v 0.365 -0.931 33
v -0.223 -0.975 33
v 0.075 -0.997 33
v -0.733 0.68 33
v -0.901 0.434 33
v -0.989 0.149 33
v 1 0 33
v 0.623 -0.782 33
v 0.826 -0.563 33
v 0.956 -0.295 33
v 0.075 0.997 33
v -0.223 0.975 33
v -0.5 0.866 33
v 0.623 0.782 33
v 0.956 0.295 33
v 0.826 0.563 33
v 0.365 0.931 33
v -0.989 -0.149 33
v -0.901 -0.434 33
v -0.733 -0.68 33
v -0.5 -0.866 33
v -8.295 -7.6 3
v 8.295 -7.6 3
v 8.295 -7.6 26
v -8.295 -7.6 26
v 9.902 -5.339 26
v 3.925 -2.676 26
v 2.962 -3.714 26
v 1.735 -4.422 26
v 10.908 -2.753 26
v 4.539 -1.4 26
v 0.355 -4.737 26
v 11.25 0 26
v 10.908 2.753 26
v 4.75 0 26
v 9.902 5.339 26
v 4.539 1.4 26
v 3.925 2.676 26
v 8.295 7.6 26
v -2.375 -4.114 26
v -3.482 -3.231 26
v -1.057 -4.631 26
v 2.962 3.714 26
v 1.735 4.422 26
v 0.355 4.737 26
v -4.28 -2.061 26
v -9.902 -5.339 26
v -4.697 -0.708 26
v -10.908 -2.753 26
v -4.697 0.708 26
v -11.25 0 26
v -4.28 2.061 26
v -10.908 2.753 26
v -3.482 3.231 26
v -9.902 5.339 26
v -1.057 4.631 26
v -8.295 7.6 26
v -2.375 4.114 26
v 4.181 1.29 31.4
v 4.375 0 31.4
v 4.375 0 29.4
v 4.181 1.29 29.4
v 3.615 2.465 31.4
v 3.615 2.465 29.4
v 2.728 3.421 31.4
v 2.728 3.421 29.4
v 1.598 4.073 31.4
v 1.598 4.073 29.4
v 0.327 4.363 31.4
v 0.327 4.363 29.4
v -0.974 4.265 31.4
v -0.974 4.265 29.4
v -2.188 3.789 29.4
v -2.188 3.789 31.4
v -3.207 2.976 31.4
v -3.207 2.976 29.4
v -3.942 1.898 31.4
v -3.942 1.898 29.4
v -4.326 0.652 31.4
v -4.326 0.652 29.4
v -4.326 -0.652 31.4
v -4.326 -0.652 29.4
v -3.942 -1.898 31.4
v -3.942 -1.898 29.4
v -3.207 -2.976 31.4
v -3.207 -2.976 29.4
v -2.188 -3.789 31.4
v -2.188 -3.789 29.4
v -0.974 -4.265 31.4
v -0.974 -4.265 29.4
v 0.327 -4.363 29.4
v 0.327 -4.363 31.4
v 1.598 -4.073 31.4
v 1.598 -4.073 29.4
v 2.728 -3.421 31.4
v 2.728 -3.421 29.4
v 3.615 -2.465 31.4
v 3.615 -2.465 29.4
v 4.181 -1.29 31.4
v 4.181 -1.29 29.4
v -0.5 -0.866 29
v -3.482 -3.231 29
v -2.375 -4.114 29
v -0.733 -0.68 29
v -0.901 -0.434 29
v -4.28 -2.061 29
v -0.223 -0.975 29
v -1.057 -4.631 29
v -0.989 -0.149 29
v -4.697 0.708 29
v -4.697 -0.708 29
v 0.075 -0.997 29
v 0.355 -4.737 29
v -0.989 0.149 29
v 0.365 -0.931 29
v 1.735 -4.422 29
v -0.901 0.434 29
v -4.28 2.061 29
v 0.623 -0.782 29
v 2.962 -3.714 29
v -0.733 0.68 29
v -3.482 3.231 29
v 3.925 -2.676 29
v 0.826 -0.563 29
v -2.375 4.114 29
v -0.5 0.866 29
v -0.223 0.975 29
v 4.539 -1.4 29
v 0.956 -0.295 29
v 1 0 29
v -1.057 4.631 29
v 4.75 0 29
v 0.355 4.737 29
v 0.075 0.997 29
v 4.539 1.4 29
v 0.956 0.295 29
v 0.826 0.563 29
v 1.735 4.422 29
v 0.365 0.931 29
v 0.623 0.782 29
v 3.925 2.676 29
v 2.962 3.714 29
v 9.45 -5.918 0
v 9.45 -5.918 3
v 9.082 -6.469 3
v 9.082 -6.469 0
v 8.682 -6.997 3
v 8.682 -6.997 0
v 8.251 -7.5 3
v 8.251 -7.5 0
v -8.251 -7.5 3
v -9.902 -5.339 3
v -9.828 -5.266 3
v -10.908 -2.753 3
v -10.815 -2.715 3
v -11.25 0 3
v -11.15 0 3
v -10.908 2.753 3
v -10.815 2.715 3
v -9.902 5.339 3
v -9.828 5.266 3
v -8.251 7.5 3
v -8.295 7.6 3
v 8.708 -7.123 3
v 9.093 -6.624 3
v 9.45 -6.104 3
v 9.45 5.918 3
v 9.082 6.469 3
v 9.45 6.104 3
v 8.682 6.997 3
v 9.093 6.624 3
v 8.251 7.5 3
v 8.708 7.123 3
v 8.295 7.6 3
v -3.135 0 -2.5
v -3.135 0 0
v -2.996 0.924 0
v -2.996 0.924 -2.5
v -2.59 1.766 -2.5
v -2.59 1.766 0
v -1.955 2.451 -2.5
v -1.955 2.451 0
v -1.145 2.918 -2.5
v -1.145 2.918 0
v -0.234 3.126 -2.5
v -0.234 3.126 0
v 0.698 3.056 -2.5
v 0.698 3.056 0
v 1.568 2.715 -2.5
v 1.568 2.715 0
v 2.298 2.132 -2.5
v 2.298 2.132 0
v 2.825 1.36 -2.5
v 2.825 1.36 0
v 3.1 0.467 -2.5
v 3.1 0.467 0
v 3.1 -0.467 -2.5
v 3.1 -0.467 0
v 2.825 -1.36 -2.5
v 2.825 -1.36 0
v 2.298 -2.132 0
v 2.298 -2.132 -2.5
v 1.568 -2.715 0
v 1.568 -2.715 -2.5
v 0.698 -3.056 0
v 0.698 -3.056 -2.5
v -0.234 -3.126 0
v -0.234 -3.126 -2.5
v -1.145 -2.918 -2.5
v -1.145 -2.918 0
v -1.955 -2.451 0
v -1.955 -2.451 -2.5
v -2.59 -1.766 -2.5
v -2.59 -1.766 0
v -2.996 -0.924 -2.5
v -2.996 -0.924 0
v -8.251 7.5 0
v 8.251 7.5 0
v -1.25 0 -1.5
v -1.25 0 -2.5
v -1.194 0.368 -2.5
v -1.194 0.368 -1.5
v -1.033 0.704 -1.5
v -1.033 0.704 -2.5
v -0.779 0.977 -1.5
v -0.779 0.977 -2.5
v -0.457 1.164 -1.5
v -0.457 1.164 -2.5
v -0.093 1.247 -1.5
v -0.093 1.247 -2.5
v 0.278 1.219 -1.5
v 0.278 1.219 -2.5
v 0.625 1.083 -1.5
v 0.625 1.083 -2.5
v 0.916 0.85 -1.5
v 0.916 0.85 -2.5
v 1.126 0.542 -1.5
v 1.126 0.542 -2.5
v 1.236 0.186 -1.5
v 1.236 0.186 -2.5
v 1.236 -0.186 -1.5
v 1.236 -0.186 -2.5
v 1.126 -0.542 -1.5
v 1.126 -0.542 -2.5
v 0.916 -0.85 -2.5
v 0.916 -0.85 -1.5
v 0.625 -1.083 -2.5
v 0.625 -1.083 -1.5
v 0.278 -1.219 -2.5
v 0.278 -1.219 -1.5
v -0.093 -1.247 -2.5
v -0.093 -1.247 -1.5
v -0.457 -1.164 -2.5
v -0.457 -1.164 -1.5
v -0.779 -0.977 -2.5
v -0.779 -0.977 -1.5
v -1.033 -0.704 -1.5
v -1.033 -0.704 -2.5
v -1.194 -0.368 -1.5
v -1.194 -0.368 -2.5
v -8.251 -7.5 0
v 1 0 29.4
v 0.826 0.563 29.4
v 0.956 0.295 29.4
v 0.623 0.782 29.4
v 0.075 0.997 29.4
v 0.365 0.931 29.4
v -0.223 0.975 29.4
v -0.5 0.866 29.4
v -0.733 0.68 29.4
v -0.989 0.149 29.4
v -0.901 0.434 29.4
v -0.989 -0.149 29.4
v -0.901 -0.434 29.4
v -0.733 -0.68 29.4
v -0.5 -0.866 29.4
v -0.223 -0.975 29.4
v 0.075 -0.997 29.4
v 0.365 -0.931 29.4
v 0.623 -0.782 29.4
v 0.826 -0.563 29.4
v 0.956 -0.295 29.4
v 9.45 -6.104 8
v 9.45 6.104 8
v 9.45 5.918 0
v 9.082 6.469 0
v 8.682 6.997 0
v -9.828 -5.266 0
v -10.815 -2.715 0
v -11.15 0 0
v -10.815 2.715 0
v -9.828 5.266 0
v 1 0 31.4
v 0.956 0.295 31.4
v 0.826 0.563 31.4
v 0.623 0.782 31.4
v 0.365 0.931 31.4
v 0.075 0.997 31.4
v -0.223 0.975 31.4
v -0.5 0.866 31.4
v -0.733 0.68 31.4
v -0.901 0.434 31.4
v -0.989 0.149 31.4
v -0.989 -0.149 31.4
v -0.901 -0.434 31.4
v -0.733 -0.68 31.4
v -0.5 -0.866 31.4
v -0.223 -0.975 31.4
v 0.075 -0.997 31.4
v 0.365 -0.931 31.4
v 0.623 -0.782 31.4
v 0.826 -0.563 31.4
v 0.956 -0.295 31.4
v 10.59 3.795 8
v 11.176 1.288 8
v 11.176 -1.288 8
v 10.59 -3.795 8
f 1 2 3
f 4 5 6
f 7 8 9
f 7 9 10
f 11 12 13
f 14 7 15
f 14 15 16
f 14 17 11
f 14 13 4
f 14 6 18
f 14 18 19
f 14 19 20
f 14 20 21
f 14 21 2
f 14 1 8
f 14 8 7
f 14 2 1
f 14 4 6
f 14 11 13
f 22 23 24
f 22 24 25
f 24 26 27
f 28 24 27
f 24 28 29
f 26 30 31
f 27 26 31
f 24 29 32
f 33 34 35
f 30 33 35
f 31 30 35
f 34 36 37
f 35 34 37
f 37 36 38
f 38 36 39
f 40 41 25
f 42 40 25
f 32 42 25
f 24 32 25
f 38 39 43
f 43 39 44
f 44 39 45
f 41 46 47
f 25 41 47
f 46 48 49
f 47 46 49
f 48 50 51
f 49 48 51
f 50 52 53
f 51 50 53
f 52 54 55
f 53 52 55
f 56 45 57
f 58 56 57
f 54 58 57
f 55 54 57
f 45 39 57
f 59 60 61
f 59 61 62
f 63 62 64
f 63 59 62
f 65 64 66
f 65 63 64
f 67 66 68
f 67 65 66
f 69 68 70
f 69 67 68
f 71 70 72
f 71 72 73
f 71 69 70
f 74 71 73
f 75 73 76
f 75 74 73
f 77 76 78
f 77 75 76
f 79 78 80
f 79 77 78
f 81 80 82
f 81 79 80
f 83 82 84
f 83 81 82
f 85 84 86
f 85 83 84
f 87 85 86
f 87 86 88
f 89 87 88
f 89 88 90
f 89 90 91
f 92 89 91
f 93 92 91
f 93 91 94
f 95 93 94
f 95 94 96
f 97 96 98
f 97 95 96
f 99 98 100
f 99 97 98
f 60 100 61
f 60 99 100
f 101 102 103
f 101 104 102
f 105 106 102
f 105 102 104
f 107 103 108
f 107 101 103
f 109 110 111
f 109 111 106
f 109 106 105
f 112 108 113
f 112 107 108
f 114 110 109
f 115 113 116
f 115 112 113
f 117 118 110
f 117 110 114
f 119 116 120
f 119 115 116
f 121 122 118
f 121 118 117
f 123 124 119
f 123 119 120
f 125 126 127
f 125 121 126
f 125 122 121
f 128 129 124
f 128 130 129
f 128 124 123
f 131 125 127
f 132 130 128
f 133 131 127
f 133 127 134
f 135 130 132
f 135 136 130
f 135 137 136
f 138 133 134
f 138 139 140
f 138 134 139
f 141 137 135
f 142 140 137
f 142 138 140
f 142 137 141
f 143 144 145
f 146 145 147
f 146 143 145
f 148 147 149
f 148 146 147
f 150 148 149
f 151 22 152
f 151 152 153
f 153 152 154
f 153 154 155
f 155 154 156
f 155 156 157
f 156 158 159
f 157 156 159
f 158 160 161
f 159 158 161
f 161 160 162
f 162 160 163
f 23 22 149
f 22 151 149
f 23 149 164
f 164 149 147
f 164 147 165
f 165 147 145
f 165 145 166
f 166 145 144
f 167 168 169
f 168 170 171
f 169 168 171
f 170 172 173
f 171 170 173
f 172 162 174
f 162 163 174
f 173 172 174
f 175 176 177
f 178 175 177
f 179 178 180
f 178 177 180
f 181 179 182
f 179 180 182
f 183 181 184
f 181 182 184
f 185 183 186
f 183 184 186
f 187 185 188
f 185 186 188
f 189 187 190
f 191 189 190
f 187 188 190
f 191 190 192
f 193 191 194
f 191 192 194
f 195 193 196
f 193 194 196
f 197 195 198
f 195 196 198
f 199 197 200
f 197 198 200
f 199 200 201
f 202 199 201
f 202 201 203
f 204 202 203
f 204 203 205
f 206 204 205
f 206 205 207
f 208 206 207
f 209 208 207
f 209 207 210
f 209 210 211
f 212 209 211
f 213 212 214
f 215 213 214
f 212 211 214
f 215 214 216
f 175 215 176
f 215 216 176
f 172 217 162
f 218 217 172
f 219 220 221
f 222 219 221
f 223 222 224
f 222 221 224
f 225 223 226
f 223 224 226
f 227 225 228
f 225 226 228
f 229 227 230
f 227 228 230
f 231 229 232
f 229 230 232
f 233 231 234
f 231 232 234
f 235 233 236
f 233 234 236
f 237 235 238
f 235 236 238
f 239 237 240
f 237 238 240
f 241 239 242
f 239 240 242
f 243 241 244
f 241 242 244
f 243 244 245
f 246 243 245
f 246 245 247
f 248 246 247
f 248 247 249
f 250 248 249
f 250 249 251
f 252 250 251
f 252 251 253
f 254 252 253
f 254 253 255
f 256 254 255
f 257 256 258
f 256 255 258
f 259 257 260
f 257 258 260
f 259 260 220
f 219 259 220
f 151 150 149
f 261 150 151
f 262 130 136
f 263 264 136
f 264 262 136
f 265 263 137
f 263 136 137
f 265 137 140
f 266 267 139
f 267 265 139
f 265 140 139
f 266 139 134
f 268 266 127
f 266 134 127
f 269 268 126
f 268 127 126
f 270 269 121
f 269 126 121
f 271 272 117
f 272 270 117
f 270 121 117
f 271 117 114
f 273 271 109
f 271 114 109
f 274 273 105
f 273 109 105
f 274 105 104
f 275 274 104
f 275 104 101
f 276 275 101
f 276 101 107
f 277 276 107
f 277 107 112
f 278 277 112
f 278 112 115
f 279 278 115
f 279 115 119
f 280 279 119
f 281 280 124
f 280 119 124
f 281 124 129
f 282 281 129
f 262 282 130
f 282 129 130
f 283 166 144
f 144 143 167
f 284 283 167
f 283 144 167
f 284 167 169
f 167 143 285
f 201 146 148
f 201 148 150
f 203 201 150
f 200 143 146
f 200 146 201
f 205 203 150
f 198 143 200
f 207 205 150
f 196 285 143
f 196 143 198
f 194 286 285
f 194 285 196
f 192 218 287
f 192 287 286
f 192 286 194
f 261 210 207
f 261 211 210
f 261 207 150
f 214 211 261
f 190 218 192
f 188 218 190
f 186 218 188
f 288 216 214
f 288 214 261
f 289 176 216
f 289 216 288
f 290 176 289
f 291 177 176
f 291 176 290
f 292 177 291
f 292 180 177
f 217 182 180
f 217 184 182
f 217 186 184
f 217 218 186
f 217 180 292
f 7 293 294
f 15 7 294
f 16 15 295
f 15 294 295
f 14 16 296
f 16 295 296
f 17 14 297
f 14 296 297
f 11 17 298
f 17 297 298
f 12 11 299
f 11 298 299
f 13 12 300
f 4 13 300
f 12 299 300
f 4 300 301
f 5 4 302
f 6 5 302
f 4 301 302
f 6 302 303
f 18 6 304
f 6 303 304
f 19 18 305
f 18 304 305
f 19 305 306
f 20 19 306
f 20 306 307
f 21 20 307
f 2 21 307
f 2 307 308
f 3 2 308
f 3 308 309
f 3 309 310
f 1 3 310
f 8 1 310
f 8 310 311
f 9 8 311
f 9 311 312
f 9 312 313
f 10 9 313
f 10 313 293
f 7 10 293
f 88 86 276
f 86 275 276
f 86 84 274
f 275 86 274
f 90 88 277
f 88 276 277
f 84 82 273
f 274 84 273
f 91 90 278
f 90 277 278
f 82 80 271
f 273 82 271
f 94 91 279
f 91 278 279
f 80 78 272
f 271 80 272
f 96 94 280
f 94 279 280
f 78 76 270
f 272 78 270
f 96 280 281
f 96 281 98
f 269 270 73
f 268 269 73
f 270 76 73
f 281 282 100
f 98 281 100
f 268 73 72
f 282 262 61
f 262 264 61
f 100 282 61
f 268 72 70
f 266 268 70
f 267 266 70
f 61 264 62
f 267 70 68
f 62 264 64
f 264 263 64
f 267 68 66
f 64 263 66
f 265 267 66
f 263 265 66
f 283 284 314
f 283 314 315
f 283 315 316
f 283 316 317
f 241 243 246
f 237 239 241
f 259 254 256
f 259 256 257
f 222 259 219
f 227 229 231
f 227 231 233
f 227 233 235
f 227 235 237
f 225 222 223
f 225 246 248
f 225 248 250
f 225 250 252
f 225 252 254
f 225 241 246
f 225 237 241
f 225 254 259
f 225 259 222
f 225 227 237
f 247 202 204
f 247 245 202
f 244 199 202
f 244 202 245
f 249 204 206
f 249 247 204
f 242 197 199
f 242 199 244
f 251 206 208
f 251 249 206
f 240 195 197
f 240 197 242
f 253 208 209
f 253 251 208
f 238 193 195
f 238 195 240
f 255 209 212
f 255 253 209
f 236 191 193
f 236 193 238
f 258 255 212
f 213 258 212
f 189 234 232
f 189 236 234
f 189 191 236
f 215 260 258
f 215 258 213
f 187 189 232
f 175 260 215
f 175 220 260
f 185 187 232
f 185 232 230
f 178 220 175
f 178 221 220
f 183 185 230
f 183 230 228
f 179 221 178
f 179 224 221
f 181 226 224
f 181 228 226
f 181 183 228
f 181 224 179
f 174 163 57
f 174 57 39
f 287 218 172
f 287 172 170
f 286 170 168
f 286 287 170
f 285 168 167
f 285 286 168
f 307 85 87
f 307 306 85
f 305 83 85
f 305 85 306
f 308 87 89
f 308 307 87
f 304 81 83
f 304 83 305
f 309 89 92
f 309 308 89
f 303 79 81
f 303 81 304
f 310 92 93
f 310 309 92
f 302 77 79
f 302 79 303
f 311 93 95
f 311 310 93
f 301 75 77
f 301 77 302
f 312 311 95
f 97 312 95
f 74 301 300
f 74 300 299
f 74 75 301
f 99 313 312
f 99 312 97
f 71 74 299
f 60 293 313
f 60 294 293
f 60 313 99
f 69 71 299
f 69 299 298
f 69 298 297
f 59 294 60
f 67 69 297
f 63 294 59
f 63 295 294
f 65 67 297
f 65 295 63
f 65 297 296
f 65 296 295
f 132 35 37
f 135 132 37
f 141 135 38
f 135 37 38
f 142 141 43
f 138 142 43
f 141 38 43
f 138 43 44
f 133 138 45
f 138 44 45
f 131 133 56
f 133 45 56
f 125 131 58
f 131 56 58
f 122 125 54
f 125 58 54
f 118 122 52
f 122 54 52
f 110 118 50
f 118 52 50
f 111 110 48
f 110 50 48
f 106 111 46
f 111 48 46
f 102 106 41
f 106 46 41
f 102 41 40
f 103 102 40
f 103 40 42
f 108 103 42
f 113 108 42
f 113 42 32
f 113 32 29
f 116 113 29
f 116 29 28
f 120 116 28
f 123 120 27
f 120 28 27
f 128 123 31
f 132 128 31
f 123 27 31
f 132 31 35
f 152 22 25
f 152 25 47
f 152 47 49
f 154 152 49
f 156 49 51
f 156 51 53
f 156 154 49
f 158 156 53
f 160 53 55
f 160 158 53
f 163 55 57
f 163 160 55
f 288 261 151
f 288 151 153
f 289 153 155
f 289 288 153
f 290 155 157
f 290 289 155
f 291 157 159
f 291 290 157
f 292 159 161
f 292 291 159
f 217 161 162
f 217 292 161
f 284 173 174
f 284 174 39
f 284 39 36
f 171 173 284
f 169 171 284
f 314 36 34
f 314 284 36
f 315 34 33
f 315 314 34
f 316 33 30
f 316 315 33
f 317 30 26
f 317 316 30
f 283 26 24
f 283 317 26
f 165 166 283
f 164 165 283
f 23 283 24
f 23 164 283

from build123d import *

# Parameters (mm, degrees)
EXTRUDE_1_DEPTH     = 26
SKETCH_2_R          = 4.75
EXTRUDE_2_DEPTH     = 3
SKETCH_3_R          = 1
EXTRUDE_3_DEPTH     = 4
SKETCH_4_R          = 4.375
T20X0_4_DEPTH       = 2
CUT_EXTRUDE_1_DEPTH = 3
SKETCH_6_R          = 3.135
EXTRUDE_5_DEPTH     = 2.5
SKETCH_7_R          = 1.25
CUT_EXTRUDE_2_DEPTH = 1
SKETCH_8_W          = 1.8
SKETCH_8_H          = 15.2
CUT_EXTRUDE_3_DEPTH = 8


with BuildPart() as part:
    # 草图1 → 凸台-拉伸1 (new body)
    with BuildSketch(Plane.XY):
        with BuildLine():
            Line((-8.294727241, 7.6), (8.294727241, 7.6))
            ThreePointArc((8.294727241, 7.6), (11.25, 0), (8.294727241, -7.6))
            Line((8.294727241, -7.6), (-8.294727241, -7.6))
            ThreePointArc((-8.294727241, -7.6), (-11.25, 0), (-8.294727241, 7.6))
        make_face()
    extrude(amount=EXTRUDE_1_DEPTH)

    # 草图2 → 凸台-拉伸2 (add)
    with BuildSketch(Plane.XY.offset(26)):
        Circle(SKETCH_2_R)
    extrude(amount=EXTRUDE_2_DEPTH)

    # 草图3 → 凸台-拉伸3 (add)
    with BuildSketch(Plane.XY.offset(29)):
        Circle(SKETCH_3_R)
    extrude(amount=EXTRUDE_3_DEPTH)

    # 草图4 → T20x0.4 (add)
    with BuildSketch(Plane.XY.offset(31.4)):
        Circle(SKETCH_4_R)
    extrude(amount=-T20X0_4_DEPTH)

    # 草图5 → 切除-拉伸1 (cut)
    with BuildSketch(Plane(origin=(0, 0, 0), x_dir=(-1, 0, 0), z_dir=(0, 0, -1))):
        with BuildLine():
            Line((8.294727241, -7.6), (-8.294727241, -7.6))
            ThreePointArc((-8.294727241, -7.6), (-11.25, 0), (-8.294727241, 7.6))
            Line((-8.294727241, 7.6), (8.294727241, 7.6))
            ThreePointArc((8.294727241, 7.6), (11.25, 0), (8.294727241, -7.6))
        make_face()
        with BuildLine():
            Line((8.250606038, 7.5), (-8.250606038, 7.5))
            ThreePointArc((-8.250606038, 7.5), (-11.15, 0), (-8.250606038, -7.5))
            Line((-8.250606038, -7.5), (8.250606038, -7.5))
            ThreePointArc((8.250606038, -7.5), (11.15, 0), (8.250606038, 7.5))
        make_face(mode=Mode.SUBTRACT)
    extrude(amount=-CUT_EXTRUDE_1_DEPTH, mode=Mode.SUBTRACT)

    # 草图6 → 凸台-拉伸5 (add)
    with BuildSketch(Plane(origin=(0, 0, 0), x_dir=(-1, 0, 0), z_dir=(0, 0, -1))):
        Circle(SKETCH_6_R)
    extrude(amount=EXTRUDE_5_DEPTH)

    # 草图7 → 切除-拉伸2 (cut)
    with BuildSketch(Plane(origin=(0, 0, -2.5), x_dir=(-1, 0, 0), z_dir=(0, 0, -1))):
        Circle(SKETCH_7_R)
    extrude(amount=-CUT_EXTRUDE_2_DEPTH, mode=Mode.SUBTRACT)

    # 草图8 → 切除-拉伸3 (cut)
    with BuildSketch(Plane(origin=(0, 0, 0), x_dir=(-1, 0, 0), z_dir=(0, 0, -1))):
        with Locations((-10.35, 0)):
            Rectangle(SKETCH_8_W, SKETCH_8_H)
    extrude(amount=-CUT_EXTRUDE_3_DEPTH, mode=Mode.SUBTRACT)


solid = part.part
